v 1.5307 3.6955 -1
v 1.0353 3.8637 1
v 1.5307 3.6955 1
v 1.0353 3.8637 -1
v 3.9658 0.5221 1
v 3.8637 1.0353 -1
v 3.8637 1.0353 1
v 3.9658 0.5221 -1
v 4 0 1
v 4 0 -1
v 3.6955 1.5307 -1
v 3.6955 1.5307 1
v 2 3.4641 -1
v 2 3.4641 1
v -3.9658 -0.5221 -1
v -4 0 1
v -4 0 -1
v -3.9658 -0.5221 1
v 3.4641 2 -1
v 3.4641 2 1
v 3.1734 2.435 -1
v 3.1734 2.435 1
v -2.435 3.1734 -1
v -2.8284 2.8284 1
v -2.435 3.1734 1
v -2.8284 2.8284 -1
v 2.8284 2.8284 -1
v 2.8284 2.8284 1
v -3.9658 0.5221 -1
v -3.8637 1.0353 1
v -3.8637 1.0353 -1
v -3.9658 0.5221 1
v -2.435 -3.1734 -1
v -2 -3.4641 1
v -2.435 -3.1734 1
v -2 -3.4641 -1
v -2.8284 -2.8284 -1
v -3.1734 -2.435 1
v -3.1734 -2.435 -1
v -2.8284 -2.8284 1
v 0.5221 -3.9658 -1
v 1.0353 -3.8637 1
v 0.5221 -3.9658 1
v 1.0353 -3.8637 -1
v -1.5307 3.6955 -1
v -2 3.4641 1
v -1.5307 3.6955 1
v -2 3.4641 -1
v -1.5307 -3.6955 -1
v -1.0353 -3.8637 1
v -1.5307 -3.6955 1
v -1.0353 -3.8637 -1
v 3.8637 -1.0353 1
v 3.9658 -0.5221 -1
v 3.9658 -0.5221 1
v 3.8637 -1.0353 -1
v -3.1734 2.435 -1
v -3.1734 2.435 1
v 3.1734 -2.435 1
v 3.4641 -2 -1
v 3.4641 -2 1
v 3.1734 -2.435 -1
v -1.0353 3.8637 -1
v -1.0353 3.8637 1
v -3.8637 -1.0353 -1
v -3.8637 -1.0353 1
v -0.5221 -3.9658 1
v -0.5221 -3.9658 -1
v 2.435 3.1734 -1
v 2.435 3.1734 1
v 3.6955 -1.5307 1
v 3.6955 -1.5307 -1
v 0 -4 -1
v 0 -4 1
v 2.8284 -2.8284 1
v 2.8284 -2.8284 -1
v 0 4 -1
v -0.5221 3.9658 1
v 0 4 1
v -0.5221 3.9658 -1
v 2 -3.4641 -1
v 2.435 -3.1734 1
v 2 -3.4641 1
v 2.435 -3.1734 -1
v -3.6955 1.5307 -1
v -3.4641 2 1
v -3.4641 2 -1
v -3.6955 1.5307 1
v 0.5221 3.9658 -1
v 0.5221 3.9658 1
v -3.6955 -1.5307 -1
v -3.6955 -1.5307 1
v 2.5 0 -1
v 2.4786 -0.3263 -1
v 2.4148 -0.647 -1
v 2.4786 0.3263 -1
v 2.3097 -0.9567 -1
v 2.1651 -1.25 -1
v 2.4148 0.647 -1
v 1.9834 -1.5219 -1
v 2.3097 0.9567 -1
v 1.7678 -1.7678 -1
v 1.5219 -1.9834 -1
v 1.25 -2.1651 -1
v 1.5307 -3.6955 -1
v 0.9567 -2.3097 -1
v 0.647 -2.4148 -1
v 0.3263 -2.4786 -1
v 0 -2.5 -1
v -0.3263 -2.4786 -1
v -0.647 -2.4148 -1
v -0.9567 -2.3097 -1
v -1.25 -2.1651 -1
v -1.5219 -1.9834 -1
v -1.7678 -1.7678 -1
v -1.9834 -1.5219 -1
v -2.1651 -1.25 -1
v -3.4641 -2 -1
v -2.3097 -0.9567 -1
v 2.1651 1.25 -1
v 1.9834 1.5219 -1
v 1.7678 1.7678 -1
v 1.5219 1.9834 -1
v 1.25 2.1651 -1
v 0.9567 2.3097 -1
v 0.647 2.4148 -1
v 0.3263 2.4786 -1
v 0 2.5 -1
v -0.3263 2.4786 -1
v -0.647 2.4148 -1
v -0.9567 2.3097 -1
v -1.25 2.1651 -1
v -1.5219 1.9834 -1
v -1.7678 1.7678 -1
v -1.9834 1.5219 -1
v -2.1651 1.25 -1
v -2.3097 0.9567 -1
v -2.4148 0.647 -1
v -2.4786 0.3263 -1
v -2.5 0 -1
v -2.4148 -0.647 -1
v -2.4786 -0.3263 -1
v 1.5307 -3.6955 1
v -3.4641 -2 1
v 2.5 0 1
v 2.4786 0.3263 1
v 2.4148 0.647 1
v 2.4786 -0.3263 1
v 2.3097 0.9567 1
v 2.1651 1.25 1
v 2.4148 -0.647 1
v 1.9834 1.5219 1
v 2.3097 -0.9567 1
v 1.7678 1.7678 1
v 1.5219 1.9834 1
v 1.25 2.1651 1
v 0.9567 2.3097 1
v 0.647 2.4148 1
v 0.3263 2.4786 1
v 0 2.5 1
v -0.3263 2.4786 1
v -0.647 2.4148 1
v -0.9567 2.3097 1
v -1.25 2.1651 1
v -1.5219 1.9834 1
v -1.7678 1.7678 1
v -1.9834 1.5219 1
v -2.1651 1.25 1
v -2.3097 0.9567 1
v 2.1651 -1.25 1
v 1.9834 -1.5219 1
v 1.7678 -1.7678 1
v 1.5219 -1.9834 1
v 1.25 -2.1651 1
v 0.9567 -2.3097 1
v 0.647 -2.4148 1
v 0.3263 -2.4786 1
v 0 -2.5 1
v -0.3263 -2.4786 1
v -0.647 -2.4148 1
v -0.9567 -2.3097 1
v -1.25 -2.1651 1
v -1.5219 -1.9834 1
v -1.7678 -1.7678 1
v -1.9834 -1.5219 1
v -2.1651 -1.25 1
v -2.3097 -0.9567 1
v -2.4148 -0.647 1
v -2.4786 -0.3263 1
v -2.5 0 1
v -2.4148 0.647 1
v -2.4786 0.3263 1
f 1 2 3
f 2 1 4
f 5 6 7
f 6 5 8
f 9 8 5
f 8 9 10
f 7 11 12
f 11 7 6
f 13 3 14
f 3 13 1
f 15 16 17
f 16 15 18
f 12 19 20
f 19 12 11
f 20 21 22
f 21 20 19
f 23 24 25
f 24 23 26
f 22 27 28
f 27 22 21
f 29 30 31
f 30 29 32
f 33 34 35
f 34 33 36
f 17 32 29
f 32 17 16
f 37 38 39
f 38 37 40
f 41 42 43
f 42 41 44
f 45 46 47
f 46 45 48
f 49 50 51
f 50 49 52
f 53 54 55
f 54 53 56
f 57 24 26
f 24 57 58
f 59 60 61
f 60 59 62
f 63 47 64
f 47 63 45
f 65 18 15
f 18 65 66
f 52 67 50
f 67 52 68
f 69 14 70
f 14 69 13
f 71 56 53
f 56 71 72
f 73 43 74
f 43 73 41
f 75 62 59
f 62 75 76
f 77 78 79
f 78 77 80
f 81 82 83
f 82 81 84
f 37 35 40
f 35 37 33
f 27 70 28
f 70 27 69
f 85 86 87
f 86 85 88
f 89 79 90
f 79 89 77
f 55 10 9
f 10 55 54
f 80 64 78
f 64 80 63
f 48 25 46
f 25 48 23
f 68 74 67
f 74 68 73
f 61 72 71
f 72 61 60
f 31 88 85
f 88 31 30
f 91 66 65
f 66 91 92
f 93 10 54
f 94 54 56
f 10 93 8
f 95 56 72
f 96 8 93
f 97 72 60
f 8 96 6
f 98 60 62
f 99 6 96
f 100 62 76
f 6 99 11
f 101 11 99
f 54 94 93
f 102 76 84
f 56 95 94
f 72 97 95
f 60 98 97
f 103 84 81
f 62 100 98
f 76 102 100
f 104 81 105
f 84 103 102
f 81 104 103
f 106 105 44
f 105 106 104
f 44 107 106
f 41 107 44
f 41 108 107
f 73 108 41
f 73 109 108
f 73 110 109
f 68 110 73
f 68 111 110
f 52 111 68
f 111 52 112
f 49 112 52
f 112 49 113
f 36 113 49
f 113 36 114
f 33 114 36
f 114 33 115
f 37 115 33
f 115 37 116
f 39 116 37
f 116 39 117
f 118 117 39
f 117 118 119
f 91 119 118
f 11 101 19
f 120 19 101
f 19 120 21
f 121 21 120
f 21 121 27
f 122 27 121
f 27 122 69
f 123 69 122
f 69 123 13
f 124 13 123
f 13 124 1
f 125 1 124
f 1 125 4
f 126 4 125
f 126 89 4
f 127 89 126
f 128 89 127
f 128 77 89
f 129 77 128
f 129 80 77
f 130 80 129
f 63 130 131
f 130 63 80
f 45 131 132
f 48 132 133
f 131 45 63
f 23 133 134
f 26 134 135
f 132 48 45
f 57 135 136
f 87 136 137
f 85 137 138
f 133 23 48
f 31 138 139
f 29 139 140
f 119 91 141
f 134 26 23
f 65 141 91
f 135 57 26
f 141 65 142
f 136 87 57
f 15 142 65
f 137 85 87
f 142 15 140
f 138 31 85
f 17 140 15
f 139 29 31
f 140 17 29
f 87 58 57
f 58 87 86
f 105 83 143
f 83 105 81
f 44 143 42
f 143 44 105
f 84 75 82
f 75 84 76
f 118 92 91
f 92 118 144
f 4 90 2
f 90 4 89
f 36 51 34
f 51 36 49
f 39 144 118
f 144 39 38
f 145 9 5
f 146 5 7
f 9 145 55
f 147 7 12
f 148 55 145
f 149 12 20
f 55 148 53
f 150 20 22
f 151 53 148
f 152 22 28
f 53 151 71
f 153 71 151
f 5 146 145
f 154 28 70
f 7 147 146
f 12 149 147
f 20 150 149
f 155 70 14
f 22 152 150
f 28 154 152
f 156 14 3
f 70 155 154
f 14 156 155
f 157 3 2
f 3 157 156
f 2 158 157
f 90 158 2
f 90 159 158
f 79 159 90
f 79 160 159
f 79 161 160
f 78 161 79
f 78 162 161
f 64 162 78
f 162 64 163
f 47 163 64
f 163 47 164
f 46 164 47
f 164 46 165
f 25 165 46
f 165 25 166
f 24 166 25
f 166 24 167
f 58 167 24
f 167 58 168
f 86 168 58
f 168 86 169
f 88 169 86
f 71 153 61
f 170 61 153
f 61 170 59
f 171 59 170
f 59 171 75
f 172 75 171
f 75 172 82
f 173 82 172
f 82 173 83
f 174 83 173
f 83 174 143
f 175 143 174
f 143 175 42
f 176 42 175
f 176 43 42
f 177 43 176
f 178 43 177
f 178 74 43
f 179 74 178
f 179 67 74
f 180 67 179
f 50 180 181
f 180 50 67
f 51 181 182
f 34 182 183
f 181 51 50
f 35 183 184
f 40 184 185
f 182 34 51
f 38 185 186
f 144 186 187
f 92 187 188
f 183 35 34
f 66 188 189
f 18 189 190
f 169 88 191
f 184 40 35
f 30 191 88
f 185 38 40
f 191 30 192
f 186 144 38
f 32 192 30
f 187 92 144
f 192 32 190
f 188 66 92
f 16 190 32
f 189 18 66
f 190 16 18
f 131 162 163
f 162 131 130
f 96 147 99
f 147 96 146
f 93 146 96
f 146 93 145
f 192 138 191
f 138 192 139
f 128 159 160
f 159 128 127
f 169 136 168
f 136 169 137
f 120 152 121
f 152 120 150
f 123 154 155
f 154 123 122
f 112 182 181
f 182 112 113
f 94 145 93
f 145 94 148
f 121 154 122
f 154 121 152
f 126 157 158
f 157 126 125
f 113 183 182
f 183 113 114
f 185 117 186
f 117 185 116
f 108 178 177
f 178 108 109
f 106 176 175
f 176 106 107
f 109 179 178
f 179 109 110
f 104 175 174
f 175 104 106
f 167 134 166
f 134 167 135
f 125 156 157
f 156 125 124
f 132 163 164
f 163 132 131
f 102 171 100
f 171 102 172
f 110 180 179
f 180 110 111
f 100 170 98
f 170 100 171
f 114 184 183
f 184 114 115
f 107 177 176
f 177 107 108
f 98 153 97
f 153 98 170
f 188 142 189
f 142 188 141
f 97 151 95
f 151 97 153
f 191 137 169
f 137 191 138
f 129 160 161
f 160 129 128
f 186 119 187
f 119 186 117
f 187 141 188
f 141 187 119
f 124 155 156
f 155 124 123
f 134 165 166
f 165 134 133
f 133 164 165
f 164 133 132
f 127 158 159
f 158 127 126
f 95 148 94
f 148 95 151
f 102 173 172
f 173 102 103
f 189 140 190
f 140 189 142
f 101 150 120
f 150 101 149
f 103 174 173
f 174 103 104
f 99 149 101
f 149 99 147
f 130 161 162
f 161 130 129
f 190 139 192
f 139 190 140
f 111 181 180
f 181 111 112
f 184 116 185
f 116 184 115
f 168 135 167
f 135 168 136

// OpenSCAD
difference()
{
	cylinder(d=8,h=2,center=true,$fn=24*2);
	cylinder(d=5,h=2+0.2,center=true,$fn=24*2);
}
